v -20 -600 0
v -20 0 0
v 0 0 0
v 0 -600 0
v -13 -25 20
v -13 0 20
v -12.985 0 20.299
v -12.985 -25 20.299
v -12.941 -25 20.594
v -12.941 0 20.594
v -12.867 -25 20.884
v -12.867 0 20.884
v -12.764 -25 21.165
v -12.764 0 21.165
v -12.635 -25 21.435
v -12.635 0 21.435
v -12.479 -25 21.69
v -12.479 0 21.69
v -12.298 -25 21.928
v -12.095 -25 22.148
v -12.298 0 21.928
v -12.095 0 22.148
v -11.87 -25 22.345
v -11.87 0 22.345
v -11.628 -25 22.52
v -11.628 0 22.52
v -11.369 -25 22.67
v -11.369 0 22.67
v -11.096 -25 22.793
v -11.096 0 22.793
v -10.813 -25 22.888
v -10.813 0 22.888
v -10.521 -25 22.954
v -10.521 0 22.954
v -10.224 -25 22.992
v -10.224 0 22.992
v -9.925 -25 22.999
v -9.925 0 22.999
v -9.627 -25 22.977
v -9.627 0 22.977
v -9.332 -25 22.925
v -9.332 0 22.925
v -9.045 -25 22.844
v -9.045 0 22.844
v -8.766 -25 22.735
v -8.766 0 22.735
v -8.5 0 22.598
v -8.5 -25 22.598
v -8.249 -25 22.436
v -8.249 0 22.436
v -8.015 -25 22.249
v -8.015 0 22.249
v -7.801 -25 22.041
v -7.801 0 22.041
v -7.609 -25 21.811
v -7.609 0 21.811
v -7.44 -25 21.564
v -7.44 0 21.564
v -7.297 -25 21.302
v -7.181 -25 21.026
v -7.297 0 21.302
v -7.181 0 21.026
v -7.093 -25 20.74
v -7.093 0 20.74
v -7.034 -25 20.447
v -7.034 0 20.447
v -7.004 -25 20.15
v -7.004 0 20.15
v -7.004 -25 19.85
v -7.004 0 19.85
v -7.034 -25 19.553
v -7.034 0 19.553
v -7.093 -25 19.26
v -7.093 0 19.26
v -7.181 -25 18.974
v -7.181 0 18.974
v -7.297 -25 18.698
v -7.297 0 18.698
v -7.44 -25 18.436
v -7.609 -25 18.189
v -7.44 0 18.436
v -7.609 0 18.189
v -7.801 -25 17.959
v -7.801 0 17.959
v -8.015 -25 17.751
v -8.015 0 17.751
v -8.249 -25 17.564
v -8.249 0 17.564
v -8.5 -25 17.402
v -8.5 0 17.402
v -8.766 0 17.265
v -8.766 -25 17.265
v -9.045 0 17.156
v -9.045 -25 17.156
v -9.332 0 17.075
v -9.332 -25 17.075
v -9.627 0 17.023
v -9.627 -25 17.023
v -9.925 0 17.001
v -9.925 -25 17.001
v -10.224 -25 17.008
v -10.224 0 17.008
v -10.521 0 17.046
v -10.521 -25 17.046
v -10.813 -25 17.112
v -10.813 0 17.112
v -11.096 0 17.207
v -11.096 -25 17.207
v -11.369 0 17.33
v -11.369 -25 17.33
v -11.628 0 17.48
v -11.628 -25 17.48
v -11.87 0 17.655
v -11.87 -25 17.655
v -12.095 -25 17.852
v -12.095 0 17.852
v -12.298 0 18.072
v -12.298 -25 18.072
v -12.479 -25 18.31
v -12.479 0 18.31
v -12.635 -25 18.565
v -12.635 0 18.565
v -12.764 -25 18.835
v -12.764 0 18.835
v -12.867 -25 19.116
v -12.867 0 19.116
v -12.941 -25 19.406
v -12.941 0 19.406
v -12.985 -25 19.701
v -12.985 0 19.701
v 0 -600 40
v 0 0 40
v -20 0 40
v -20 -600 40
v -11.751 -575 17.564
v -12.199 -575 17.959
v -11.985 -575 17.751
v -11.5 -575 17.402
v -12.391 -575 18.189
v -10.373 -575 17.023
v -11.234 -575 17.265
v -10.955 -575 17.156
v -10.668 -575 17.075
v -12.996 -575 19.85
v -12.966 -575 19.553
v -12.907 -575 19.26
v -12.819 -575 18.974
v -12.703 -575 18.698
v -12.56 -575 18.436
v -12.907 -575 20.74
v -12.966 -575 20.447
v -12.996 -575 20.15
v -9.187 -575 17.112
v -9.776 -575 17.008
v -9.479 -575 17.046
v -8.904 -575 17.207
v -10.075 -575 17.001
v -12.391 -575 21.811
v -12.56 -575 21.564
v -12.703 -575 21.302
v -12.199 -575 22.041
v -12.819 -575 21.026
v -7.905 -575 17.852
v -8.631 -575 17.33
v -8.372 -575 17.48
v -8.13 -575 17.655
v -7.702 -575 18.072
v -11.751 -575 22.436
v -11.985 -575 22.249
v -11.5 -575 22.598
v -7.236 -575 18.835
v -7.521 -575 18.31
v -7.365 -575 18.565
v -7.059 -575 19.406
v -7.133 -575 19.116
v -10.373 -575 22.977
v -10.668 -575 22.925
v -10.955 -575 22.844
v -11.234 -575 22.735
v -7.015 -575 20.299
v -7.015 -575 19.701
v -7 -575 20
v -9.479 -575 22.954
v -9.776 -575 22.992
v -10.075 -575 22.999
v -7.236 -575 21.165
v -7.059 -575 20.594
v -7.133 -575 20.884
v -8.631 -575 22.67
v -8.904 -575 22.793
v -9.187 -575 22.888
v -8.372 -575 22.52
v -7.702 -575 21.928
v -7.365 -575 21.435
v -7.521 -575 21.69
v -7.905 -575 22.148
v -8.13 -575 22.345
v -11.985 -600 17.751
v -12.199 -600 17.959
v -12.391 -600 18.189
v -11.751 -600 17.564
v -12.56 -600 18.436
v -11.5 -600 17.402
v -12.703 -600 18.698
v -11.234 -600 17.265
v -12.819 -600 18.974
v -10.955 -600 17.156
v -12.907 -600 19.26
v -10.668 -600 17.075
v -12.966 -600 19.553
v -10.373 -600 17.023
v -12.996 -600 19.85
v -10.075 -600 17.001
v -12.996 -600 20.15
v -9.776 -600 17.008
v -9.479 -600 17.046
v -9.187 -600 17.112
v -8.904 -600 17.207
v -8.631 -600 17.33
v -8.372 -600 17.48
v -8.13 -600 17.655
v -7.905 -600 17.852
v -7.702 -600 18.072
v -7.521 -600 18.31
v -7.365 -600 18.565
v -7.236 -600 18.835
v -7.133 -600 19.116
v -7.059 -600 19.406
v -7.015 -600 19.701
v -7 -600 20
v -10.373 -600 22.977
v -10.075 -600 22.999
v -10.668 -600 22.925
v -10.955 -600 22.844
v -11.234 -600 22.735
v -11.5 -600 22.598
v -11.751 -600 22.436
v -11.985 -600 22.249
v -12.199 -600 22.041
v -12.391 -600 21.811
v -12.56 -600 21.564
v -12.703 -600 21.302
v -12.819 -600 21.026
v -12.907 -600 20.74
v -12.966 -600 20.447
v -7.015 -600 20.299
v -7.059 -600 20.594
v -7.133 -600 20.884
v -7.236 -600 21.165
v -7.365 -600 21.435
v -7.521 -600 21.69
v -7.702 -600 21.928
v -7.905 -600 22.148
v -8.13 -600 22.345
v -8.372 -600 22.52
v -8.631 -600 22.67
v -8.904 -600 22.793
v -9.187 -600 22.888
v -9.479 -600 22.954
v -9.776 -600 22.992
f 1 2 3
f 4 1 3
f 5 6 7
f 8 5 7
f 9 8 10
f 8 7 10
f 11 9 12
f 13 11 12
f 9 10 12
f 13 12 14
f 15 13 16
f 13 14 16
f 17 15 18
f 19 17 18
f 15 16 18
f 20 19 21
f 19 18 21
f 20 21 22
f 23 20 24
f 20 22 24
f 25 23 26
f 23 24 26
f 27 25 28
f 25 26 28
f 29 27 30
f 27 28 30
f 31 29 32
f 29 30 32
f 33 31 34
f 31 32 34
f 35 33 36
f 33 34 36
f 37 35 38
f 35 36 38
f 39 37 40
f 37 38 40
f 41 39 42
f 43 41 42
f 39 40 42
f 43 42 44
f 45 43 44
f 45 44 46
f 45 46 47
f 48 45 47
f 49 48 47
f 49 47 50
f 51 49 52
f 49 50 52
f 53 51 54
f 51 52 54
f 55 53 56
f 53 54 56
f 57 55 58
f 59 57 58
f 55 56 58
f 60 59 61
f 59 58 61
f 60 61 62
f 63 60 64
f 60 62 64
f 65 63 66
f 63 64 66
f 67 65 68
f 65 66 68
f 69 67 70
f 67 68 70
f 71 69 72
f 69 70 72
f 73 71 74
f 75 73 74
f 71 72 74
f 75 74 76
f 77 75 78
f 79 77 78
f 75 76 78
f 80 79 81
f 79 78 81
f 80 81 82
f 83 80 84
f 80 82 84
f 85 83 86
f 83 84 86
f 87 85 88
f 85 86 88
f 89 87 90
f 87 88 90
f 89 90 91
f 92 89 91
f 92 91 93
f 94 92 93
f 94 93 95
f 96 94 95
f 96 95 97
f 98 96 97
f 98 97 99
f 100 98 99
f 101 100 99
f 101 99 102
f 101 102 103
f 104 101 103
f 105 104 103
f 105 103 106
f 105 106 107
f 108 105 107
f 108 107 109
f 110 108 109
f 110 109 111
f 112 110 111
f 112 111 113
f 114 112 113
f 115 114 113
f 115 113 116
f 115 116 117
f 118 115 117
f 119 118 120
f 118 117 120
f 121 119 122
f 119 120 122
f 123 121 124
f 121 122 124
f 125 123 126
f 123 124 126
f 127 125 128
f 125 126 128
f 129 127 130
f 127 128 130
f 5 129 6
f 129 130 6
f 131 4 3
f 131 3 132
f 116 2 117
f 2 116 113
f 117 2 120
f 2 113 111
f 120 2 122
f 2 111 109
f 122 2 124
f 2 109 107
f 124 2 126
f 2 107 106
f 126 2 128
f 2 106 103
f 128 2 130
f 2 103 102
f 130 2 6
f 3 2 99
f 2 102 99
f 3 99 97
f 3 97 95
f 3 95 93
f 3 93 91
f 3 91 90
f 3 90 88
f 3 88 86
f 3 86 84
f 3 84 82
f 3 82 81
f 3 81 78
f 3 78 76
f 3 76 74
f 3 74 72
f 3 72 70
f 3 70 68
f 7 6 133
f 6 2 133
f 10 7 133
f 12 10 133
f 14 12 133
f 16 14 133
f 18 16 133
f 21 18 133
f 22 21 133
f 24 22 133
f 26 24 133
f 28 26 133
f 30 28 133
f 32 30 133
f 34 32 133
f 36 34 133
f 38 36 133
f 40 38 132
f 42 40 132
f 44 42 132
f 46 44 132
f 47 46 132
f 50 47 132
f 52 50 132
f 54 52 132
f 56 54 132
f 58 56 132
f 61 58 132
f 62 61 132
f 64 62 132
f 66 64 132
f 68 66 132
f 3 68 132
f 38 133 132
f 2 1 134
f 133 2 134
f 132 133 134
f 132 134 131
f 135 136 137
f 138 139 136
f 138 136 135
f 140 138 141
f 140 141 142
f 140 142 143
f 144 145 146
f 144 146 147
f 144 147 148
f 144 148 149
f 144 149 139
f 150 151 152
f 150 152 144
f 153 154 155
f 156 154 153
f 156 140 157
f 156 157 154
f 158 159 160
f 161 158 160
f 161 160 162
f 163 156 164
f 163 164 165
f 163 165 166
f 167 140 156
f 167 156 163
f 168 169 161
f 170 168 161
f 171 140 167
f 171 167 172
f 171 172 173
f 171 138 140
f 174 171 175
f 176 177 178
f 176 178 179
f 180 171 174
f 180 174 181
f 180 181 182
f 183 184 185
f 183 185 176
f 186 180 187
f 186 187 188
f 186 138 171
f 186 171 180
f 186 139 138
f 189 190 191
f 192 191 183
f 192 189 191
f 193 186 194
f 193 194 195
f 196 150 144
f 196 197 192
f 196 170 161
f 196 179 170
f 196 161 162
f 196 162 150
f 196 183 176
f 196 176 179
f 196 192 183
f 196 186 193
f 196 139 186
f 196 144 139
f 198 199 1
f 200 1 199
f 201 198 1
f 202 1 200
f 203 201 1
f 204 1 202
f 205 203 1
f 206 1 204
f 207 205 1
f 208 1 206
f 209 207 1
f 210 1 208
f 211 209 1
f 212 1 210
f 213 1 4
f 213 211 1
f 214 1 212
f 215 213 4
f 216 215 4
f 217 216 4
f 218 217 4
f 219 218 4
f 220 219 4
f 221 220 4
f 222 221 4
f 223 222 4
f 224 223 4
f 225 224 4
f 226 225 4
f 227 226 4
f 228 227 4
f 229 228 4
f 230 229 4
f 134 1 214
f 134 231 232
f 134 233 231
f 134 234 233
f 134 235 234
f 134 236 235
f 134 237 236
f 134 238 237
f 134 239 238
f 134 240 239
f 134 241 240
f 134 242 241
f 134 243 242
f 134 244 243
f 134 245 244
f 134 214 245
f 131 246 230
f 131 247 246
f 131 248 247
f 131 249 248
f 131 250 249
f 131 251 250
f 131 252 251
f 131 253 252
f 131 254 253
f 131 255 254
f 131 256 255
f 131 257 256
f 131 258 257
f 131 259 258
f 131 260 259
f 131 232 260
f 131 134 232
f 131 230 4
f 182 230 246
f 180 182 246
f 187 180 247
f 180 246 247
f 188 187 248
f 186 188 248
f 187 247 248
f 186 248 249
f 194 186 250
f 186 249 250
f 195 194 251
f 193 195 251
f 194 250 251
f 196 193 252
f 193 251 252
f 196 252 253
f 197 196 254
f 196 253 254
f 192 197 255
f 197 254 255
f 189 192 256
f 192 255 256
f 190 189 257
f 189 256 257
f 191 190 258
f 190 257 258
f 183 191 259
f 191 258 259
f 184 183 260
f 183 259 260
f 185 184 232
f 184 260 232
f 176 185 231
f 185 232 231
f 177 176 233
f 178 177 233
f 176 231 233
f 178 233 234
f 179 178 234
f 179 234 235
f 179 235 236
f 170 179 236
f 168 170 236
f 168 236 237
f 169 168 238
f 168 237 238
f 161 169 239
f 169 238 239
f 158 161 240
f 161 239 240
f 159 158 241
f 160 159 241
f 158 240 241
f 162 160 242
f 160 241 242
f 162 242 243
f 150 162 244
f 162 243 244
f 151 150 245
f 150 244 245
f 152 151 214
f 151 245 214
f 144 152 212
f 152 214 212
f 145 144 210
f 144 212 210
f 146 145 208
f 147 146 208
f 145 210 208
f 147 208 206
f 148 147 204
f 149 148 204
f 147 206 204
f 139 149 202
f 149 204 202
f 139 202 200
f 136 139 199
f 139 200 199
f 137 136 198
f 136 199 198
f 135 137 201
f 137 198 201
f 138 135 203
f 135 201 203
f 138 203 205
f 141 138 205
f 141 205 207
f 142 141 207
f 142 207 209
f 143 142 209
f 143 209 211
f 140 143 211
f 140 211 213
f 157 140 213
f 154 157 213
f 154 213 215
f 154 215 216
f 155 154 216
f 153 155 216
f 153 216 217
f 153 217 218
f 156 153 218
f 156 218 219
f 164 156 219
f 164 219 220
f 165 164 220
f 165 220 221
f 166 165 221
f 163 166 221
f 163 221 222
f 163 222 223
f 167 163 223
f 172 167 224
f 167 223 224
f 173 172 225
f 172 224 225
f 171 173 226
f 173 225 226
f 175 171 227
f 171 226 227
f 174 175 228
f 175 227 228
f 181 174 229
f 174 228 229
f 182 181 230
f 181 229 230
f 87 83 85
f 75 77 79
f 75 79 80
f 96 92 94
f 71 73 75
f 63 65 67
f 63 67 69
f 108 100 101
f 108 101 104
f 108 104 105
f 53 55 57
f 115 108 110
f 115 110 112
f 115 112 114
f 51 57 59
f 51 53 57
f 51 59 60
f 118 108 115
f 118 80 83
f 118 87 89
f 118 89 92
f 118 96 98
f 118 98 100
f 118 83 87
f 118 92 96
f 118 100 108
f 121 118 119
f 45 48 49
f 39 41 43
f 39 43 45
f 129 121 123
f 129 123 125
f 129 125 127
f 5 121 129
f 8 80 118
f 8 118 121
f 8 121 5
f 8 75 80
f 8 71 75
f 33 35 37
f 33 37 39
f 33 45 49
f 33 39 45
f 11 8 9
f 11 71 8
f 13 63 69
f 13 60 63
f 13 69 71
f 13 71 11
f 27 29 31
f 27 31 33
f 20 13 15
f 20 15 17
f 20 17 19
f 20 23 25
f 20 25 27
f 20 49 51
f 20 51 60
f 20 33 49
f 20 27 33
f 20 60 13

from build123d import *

# Parameters (mm, degrees)
F0_W     = 20
F0_H     = 40
F1_DEPTH = 600
F2_R     = 3
F3_DEPTH = 25
F4_R     = 3
F5_DEPTH = 25


with BuildPart() as f1:
    # F0 (on Front) → F1 (new body)
    with BuildSketch(Plane.XZ):
        with Locations((-10, 20)):
            Rectangle(F0_W, F0_H)
    extrude(amount=F1_DEPTH)

    # F2 (on face) → F3 (cut)
    with BuildSketch(Plane(origin=(0, 0, 0), x_dir=(-1, 0, 0), z_dir=(0, 1, 0))):
        with Locations((10, 20)):
            Circle(F2_R)
    extrude(amount=-F3_DEPTH, mode=Mode.SUBTRACT)

    # F4 (on face) → F5 (cut)
    with BuildSketch(Plane.XZ.offset(600)):
        with Locations((-10, 20)):
            Circle(F4_R)
    extrude(amount=-F5_DEPTH, mode=Mode.SUBTRACT)


solid = f1.part
